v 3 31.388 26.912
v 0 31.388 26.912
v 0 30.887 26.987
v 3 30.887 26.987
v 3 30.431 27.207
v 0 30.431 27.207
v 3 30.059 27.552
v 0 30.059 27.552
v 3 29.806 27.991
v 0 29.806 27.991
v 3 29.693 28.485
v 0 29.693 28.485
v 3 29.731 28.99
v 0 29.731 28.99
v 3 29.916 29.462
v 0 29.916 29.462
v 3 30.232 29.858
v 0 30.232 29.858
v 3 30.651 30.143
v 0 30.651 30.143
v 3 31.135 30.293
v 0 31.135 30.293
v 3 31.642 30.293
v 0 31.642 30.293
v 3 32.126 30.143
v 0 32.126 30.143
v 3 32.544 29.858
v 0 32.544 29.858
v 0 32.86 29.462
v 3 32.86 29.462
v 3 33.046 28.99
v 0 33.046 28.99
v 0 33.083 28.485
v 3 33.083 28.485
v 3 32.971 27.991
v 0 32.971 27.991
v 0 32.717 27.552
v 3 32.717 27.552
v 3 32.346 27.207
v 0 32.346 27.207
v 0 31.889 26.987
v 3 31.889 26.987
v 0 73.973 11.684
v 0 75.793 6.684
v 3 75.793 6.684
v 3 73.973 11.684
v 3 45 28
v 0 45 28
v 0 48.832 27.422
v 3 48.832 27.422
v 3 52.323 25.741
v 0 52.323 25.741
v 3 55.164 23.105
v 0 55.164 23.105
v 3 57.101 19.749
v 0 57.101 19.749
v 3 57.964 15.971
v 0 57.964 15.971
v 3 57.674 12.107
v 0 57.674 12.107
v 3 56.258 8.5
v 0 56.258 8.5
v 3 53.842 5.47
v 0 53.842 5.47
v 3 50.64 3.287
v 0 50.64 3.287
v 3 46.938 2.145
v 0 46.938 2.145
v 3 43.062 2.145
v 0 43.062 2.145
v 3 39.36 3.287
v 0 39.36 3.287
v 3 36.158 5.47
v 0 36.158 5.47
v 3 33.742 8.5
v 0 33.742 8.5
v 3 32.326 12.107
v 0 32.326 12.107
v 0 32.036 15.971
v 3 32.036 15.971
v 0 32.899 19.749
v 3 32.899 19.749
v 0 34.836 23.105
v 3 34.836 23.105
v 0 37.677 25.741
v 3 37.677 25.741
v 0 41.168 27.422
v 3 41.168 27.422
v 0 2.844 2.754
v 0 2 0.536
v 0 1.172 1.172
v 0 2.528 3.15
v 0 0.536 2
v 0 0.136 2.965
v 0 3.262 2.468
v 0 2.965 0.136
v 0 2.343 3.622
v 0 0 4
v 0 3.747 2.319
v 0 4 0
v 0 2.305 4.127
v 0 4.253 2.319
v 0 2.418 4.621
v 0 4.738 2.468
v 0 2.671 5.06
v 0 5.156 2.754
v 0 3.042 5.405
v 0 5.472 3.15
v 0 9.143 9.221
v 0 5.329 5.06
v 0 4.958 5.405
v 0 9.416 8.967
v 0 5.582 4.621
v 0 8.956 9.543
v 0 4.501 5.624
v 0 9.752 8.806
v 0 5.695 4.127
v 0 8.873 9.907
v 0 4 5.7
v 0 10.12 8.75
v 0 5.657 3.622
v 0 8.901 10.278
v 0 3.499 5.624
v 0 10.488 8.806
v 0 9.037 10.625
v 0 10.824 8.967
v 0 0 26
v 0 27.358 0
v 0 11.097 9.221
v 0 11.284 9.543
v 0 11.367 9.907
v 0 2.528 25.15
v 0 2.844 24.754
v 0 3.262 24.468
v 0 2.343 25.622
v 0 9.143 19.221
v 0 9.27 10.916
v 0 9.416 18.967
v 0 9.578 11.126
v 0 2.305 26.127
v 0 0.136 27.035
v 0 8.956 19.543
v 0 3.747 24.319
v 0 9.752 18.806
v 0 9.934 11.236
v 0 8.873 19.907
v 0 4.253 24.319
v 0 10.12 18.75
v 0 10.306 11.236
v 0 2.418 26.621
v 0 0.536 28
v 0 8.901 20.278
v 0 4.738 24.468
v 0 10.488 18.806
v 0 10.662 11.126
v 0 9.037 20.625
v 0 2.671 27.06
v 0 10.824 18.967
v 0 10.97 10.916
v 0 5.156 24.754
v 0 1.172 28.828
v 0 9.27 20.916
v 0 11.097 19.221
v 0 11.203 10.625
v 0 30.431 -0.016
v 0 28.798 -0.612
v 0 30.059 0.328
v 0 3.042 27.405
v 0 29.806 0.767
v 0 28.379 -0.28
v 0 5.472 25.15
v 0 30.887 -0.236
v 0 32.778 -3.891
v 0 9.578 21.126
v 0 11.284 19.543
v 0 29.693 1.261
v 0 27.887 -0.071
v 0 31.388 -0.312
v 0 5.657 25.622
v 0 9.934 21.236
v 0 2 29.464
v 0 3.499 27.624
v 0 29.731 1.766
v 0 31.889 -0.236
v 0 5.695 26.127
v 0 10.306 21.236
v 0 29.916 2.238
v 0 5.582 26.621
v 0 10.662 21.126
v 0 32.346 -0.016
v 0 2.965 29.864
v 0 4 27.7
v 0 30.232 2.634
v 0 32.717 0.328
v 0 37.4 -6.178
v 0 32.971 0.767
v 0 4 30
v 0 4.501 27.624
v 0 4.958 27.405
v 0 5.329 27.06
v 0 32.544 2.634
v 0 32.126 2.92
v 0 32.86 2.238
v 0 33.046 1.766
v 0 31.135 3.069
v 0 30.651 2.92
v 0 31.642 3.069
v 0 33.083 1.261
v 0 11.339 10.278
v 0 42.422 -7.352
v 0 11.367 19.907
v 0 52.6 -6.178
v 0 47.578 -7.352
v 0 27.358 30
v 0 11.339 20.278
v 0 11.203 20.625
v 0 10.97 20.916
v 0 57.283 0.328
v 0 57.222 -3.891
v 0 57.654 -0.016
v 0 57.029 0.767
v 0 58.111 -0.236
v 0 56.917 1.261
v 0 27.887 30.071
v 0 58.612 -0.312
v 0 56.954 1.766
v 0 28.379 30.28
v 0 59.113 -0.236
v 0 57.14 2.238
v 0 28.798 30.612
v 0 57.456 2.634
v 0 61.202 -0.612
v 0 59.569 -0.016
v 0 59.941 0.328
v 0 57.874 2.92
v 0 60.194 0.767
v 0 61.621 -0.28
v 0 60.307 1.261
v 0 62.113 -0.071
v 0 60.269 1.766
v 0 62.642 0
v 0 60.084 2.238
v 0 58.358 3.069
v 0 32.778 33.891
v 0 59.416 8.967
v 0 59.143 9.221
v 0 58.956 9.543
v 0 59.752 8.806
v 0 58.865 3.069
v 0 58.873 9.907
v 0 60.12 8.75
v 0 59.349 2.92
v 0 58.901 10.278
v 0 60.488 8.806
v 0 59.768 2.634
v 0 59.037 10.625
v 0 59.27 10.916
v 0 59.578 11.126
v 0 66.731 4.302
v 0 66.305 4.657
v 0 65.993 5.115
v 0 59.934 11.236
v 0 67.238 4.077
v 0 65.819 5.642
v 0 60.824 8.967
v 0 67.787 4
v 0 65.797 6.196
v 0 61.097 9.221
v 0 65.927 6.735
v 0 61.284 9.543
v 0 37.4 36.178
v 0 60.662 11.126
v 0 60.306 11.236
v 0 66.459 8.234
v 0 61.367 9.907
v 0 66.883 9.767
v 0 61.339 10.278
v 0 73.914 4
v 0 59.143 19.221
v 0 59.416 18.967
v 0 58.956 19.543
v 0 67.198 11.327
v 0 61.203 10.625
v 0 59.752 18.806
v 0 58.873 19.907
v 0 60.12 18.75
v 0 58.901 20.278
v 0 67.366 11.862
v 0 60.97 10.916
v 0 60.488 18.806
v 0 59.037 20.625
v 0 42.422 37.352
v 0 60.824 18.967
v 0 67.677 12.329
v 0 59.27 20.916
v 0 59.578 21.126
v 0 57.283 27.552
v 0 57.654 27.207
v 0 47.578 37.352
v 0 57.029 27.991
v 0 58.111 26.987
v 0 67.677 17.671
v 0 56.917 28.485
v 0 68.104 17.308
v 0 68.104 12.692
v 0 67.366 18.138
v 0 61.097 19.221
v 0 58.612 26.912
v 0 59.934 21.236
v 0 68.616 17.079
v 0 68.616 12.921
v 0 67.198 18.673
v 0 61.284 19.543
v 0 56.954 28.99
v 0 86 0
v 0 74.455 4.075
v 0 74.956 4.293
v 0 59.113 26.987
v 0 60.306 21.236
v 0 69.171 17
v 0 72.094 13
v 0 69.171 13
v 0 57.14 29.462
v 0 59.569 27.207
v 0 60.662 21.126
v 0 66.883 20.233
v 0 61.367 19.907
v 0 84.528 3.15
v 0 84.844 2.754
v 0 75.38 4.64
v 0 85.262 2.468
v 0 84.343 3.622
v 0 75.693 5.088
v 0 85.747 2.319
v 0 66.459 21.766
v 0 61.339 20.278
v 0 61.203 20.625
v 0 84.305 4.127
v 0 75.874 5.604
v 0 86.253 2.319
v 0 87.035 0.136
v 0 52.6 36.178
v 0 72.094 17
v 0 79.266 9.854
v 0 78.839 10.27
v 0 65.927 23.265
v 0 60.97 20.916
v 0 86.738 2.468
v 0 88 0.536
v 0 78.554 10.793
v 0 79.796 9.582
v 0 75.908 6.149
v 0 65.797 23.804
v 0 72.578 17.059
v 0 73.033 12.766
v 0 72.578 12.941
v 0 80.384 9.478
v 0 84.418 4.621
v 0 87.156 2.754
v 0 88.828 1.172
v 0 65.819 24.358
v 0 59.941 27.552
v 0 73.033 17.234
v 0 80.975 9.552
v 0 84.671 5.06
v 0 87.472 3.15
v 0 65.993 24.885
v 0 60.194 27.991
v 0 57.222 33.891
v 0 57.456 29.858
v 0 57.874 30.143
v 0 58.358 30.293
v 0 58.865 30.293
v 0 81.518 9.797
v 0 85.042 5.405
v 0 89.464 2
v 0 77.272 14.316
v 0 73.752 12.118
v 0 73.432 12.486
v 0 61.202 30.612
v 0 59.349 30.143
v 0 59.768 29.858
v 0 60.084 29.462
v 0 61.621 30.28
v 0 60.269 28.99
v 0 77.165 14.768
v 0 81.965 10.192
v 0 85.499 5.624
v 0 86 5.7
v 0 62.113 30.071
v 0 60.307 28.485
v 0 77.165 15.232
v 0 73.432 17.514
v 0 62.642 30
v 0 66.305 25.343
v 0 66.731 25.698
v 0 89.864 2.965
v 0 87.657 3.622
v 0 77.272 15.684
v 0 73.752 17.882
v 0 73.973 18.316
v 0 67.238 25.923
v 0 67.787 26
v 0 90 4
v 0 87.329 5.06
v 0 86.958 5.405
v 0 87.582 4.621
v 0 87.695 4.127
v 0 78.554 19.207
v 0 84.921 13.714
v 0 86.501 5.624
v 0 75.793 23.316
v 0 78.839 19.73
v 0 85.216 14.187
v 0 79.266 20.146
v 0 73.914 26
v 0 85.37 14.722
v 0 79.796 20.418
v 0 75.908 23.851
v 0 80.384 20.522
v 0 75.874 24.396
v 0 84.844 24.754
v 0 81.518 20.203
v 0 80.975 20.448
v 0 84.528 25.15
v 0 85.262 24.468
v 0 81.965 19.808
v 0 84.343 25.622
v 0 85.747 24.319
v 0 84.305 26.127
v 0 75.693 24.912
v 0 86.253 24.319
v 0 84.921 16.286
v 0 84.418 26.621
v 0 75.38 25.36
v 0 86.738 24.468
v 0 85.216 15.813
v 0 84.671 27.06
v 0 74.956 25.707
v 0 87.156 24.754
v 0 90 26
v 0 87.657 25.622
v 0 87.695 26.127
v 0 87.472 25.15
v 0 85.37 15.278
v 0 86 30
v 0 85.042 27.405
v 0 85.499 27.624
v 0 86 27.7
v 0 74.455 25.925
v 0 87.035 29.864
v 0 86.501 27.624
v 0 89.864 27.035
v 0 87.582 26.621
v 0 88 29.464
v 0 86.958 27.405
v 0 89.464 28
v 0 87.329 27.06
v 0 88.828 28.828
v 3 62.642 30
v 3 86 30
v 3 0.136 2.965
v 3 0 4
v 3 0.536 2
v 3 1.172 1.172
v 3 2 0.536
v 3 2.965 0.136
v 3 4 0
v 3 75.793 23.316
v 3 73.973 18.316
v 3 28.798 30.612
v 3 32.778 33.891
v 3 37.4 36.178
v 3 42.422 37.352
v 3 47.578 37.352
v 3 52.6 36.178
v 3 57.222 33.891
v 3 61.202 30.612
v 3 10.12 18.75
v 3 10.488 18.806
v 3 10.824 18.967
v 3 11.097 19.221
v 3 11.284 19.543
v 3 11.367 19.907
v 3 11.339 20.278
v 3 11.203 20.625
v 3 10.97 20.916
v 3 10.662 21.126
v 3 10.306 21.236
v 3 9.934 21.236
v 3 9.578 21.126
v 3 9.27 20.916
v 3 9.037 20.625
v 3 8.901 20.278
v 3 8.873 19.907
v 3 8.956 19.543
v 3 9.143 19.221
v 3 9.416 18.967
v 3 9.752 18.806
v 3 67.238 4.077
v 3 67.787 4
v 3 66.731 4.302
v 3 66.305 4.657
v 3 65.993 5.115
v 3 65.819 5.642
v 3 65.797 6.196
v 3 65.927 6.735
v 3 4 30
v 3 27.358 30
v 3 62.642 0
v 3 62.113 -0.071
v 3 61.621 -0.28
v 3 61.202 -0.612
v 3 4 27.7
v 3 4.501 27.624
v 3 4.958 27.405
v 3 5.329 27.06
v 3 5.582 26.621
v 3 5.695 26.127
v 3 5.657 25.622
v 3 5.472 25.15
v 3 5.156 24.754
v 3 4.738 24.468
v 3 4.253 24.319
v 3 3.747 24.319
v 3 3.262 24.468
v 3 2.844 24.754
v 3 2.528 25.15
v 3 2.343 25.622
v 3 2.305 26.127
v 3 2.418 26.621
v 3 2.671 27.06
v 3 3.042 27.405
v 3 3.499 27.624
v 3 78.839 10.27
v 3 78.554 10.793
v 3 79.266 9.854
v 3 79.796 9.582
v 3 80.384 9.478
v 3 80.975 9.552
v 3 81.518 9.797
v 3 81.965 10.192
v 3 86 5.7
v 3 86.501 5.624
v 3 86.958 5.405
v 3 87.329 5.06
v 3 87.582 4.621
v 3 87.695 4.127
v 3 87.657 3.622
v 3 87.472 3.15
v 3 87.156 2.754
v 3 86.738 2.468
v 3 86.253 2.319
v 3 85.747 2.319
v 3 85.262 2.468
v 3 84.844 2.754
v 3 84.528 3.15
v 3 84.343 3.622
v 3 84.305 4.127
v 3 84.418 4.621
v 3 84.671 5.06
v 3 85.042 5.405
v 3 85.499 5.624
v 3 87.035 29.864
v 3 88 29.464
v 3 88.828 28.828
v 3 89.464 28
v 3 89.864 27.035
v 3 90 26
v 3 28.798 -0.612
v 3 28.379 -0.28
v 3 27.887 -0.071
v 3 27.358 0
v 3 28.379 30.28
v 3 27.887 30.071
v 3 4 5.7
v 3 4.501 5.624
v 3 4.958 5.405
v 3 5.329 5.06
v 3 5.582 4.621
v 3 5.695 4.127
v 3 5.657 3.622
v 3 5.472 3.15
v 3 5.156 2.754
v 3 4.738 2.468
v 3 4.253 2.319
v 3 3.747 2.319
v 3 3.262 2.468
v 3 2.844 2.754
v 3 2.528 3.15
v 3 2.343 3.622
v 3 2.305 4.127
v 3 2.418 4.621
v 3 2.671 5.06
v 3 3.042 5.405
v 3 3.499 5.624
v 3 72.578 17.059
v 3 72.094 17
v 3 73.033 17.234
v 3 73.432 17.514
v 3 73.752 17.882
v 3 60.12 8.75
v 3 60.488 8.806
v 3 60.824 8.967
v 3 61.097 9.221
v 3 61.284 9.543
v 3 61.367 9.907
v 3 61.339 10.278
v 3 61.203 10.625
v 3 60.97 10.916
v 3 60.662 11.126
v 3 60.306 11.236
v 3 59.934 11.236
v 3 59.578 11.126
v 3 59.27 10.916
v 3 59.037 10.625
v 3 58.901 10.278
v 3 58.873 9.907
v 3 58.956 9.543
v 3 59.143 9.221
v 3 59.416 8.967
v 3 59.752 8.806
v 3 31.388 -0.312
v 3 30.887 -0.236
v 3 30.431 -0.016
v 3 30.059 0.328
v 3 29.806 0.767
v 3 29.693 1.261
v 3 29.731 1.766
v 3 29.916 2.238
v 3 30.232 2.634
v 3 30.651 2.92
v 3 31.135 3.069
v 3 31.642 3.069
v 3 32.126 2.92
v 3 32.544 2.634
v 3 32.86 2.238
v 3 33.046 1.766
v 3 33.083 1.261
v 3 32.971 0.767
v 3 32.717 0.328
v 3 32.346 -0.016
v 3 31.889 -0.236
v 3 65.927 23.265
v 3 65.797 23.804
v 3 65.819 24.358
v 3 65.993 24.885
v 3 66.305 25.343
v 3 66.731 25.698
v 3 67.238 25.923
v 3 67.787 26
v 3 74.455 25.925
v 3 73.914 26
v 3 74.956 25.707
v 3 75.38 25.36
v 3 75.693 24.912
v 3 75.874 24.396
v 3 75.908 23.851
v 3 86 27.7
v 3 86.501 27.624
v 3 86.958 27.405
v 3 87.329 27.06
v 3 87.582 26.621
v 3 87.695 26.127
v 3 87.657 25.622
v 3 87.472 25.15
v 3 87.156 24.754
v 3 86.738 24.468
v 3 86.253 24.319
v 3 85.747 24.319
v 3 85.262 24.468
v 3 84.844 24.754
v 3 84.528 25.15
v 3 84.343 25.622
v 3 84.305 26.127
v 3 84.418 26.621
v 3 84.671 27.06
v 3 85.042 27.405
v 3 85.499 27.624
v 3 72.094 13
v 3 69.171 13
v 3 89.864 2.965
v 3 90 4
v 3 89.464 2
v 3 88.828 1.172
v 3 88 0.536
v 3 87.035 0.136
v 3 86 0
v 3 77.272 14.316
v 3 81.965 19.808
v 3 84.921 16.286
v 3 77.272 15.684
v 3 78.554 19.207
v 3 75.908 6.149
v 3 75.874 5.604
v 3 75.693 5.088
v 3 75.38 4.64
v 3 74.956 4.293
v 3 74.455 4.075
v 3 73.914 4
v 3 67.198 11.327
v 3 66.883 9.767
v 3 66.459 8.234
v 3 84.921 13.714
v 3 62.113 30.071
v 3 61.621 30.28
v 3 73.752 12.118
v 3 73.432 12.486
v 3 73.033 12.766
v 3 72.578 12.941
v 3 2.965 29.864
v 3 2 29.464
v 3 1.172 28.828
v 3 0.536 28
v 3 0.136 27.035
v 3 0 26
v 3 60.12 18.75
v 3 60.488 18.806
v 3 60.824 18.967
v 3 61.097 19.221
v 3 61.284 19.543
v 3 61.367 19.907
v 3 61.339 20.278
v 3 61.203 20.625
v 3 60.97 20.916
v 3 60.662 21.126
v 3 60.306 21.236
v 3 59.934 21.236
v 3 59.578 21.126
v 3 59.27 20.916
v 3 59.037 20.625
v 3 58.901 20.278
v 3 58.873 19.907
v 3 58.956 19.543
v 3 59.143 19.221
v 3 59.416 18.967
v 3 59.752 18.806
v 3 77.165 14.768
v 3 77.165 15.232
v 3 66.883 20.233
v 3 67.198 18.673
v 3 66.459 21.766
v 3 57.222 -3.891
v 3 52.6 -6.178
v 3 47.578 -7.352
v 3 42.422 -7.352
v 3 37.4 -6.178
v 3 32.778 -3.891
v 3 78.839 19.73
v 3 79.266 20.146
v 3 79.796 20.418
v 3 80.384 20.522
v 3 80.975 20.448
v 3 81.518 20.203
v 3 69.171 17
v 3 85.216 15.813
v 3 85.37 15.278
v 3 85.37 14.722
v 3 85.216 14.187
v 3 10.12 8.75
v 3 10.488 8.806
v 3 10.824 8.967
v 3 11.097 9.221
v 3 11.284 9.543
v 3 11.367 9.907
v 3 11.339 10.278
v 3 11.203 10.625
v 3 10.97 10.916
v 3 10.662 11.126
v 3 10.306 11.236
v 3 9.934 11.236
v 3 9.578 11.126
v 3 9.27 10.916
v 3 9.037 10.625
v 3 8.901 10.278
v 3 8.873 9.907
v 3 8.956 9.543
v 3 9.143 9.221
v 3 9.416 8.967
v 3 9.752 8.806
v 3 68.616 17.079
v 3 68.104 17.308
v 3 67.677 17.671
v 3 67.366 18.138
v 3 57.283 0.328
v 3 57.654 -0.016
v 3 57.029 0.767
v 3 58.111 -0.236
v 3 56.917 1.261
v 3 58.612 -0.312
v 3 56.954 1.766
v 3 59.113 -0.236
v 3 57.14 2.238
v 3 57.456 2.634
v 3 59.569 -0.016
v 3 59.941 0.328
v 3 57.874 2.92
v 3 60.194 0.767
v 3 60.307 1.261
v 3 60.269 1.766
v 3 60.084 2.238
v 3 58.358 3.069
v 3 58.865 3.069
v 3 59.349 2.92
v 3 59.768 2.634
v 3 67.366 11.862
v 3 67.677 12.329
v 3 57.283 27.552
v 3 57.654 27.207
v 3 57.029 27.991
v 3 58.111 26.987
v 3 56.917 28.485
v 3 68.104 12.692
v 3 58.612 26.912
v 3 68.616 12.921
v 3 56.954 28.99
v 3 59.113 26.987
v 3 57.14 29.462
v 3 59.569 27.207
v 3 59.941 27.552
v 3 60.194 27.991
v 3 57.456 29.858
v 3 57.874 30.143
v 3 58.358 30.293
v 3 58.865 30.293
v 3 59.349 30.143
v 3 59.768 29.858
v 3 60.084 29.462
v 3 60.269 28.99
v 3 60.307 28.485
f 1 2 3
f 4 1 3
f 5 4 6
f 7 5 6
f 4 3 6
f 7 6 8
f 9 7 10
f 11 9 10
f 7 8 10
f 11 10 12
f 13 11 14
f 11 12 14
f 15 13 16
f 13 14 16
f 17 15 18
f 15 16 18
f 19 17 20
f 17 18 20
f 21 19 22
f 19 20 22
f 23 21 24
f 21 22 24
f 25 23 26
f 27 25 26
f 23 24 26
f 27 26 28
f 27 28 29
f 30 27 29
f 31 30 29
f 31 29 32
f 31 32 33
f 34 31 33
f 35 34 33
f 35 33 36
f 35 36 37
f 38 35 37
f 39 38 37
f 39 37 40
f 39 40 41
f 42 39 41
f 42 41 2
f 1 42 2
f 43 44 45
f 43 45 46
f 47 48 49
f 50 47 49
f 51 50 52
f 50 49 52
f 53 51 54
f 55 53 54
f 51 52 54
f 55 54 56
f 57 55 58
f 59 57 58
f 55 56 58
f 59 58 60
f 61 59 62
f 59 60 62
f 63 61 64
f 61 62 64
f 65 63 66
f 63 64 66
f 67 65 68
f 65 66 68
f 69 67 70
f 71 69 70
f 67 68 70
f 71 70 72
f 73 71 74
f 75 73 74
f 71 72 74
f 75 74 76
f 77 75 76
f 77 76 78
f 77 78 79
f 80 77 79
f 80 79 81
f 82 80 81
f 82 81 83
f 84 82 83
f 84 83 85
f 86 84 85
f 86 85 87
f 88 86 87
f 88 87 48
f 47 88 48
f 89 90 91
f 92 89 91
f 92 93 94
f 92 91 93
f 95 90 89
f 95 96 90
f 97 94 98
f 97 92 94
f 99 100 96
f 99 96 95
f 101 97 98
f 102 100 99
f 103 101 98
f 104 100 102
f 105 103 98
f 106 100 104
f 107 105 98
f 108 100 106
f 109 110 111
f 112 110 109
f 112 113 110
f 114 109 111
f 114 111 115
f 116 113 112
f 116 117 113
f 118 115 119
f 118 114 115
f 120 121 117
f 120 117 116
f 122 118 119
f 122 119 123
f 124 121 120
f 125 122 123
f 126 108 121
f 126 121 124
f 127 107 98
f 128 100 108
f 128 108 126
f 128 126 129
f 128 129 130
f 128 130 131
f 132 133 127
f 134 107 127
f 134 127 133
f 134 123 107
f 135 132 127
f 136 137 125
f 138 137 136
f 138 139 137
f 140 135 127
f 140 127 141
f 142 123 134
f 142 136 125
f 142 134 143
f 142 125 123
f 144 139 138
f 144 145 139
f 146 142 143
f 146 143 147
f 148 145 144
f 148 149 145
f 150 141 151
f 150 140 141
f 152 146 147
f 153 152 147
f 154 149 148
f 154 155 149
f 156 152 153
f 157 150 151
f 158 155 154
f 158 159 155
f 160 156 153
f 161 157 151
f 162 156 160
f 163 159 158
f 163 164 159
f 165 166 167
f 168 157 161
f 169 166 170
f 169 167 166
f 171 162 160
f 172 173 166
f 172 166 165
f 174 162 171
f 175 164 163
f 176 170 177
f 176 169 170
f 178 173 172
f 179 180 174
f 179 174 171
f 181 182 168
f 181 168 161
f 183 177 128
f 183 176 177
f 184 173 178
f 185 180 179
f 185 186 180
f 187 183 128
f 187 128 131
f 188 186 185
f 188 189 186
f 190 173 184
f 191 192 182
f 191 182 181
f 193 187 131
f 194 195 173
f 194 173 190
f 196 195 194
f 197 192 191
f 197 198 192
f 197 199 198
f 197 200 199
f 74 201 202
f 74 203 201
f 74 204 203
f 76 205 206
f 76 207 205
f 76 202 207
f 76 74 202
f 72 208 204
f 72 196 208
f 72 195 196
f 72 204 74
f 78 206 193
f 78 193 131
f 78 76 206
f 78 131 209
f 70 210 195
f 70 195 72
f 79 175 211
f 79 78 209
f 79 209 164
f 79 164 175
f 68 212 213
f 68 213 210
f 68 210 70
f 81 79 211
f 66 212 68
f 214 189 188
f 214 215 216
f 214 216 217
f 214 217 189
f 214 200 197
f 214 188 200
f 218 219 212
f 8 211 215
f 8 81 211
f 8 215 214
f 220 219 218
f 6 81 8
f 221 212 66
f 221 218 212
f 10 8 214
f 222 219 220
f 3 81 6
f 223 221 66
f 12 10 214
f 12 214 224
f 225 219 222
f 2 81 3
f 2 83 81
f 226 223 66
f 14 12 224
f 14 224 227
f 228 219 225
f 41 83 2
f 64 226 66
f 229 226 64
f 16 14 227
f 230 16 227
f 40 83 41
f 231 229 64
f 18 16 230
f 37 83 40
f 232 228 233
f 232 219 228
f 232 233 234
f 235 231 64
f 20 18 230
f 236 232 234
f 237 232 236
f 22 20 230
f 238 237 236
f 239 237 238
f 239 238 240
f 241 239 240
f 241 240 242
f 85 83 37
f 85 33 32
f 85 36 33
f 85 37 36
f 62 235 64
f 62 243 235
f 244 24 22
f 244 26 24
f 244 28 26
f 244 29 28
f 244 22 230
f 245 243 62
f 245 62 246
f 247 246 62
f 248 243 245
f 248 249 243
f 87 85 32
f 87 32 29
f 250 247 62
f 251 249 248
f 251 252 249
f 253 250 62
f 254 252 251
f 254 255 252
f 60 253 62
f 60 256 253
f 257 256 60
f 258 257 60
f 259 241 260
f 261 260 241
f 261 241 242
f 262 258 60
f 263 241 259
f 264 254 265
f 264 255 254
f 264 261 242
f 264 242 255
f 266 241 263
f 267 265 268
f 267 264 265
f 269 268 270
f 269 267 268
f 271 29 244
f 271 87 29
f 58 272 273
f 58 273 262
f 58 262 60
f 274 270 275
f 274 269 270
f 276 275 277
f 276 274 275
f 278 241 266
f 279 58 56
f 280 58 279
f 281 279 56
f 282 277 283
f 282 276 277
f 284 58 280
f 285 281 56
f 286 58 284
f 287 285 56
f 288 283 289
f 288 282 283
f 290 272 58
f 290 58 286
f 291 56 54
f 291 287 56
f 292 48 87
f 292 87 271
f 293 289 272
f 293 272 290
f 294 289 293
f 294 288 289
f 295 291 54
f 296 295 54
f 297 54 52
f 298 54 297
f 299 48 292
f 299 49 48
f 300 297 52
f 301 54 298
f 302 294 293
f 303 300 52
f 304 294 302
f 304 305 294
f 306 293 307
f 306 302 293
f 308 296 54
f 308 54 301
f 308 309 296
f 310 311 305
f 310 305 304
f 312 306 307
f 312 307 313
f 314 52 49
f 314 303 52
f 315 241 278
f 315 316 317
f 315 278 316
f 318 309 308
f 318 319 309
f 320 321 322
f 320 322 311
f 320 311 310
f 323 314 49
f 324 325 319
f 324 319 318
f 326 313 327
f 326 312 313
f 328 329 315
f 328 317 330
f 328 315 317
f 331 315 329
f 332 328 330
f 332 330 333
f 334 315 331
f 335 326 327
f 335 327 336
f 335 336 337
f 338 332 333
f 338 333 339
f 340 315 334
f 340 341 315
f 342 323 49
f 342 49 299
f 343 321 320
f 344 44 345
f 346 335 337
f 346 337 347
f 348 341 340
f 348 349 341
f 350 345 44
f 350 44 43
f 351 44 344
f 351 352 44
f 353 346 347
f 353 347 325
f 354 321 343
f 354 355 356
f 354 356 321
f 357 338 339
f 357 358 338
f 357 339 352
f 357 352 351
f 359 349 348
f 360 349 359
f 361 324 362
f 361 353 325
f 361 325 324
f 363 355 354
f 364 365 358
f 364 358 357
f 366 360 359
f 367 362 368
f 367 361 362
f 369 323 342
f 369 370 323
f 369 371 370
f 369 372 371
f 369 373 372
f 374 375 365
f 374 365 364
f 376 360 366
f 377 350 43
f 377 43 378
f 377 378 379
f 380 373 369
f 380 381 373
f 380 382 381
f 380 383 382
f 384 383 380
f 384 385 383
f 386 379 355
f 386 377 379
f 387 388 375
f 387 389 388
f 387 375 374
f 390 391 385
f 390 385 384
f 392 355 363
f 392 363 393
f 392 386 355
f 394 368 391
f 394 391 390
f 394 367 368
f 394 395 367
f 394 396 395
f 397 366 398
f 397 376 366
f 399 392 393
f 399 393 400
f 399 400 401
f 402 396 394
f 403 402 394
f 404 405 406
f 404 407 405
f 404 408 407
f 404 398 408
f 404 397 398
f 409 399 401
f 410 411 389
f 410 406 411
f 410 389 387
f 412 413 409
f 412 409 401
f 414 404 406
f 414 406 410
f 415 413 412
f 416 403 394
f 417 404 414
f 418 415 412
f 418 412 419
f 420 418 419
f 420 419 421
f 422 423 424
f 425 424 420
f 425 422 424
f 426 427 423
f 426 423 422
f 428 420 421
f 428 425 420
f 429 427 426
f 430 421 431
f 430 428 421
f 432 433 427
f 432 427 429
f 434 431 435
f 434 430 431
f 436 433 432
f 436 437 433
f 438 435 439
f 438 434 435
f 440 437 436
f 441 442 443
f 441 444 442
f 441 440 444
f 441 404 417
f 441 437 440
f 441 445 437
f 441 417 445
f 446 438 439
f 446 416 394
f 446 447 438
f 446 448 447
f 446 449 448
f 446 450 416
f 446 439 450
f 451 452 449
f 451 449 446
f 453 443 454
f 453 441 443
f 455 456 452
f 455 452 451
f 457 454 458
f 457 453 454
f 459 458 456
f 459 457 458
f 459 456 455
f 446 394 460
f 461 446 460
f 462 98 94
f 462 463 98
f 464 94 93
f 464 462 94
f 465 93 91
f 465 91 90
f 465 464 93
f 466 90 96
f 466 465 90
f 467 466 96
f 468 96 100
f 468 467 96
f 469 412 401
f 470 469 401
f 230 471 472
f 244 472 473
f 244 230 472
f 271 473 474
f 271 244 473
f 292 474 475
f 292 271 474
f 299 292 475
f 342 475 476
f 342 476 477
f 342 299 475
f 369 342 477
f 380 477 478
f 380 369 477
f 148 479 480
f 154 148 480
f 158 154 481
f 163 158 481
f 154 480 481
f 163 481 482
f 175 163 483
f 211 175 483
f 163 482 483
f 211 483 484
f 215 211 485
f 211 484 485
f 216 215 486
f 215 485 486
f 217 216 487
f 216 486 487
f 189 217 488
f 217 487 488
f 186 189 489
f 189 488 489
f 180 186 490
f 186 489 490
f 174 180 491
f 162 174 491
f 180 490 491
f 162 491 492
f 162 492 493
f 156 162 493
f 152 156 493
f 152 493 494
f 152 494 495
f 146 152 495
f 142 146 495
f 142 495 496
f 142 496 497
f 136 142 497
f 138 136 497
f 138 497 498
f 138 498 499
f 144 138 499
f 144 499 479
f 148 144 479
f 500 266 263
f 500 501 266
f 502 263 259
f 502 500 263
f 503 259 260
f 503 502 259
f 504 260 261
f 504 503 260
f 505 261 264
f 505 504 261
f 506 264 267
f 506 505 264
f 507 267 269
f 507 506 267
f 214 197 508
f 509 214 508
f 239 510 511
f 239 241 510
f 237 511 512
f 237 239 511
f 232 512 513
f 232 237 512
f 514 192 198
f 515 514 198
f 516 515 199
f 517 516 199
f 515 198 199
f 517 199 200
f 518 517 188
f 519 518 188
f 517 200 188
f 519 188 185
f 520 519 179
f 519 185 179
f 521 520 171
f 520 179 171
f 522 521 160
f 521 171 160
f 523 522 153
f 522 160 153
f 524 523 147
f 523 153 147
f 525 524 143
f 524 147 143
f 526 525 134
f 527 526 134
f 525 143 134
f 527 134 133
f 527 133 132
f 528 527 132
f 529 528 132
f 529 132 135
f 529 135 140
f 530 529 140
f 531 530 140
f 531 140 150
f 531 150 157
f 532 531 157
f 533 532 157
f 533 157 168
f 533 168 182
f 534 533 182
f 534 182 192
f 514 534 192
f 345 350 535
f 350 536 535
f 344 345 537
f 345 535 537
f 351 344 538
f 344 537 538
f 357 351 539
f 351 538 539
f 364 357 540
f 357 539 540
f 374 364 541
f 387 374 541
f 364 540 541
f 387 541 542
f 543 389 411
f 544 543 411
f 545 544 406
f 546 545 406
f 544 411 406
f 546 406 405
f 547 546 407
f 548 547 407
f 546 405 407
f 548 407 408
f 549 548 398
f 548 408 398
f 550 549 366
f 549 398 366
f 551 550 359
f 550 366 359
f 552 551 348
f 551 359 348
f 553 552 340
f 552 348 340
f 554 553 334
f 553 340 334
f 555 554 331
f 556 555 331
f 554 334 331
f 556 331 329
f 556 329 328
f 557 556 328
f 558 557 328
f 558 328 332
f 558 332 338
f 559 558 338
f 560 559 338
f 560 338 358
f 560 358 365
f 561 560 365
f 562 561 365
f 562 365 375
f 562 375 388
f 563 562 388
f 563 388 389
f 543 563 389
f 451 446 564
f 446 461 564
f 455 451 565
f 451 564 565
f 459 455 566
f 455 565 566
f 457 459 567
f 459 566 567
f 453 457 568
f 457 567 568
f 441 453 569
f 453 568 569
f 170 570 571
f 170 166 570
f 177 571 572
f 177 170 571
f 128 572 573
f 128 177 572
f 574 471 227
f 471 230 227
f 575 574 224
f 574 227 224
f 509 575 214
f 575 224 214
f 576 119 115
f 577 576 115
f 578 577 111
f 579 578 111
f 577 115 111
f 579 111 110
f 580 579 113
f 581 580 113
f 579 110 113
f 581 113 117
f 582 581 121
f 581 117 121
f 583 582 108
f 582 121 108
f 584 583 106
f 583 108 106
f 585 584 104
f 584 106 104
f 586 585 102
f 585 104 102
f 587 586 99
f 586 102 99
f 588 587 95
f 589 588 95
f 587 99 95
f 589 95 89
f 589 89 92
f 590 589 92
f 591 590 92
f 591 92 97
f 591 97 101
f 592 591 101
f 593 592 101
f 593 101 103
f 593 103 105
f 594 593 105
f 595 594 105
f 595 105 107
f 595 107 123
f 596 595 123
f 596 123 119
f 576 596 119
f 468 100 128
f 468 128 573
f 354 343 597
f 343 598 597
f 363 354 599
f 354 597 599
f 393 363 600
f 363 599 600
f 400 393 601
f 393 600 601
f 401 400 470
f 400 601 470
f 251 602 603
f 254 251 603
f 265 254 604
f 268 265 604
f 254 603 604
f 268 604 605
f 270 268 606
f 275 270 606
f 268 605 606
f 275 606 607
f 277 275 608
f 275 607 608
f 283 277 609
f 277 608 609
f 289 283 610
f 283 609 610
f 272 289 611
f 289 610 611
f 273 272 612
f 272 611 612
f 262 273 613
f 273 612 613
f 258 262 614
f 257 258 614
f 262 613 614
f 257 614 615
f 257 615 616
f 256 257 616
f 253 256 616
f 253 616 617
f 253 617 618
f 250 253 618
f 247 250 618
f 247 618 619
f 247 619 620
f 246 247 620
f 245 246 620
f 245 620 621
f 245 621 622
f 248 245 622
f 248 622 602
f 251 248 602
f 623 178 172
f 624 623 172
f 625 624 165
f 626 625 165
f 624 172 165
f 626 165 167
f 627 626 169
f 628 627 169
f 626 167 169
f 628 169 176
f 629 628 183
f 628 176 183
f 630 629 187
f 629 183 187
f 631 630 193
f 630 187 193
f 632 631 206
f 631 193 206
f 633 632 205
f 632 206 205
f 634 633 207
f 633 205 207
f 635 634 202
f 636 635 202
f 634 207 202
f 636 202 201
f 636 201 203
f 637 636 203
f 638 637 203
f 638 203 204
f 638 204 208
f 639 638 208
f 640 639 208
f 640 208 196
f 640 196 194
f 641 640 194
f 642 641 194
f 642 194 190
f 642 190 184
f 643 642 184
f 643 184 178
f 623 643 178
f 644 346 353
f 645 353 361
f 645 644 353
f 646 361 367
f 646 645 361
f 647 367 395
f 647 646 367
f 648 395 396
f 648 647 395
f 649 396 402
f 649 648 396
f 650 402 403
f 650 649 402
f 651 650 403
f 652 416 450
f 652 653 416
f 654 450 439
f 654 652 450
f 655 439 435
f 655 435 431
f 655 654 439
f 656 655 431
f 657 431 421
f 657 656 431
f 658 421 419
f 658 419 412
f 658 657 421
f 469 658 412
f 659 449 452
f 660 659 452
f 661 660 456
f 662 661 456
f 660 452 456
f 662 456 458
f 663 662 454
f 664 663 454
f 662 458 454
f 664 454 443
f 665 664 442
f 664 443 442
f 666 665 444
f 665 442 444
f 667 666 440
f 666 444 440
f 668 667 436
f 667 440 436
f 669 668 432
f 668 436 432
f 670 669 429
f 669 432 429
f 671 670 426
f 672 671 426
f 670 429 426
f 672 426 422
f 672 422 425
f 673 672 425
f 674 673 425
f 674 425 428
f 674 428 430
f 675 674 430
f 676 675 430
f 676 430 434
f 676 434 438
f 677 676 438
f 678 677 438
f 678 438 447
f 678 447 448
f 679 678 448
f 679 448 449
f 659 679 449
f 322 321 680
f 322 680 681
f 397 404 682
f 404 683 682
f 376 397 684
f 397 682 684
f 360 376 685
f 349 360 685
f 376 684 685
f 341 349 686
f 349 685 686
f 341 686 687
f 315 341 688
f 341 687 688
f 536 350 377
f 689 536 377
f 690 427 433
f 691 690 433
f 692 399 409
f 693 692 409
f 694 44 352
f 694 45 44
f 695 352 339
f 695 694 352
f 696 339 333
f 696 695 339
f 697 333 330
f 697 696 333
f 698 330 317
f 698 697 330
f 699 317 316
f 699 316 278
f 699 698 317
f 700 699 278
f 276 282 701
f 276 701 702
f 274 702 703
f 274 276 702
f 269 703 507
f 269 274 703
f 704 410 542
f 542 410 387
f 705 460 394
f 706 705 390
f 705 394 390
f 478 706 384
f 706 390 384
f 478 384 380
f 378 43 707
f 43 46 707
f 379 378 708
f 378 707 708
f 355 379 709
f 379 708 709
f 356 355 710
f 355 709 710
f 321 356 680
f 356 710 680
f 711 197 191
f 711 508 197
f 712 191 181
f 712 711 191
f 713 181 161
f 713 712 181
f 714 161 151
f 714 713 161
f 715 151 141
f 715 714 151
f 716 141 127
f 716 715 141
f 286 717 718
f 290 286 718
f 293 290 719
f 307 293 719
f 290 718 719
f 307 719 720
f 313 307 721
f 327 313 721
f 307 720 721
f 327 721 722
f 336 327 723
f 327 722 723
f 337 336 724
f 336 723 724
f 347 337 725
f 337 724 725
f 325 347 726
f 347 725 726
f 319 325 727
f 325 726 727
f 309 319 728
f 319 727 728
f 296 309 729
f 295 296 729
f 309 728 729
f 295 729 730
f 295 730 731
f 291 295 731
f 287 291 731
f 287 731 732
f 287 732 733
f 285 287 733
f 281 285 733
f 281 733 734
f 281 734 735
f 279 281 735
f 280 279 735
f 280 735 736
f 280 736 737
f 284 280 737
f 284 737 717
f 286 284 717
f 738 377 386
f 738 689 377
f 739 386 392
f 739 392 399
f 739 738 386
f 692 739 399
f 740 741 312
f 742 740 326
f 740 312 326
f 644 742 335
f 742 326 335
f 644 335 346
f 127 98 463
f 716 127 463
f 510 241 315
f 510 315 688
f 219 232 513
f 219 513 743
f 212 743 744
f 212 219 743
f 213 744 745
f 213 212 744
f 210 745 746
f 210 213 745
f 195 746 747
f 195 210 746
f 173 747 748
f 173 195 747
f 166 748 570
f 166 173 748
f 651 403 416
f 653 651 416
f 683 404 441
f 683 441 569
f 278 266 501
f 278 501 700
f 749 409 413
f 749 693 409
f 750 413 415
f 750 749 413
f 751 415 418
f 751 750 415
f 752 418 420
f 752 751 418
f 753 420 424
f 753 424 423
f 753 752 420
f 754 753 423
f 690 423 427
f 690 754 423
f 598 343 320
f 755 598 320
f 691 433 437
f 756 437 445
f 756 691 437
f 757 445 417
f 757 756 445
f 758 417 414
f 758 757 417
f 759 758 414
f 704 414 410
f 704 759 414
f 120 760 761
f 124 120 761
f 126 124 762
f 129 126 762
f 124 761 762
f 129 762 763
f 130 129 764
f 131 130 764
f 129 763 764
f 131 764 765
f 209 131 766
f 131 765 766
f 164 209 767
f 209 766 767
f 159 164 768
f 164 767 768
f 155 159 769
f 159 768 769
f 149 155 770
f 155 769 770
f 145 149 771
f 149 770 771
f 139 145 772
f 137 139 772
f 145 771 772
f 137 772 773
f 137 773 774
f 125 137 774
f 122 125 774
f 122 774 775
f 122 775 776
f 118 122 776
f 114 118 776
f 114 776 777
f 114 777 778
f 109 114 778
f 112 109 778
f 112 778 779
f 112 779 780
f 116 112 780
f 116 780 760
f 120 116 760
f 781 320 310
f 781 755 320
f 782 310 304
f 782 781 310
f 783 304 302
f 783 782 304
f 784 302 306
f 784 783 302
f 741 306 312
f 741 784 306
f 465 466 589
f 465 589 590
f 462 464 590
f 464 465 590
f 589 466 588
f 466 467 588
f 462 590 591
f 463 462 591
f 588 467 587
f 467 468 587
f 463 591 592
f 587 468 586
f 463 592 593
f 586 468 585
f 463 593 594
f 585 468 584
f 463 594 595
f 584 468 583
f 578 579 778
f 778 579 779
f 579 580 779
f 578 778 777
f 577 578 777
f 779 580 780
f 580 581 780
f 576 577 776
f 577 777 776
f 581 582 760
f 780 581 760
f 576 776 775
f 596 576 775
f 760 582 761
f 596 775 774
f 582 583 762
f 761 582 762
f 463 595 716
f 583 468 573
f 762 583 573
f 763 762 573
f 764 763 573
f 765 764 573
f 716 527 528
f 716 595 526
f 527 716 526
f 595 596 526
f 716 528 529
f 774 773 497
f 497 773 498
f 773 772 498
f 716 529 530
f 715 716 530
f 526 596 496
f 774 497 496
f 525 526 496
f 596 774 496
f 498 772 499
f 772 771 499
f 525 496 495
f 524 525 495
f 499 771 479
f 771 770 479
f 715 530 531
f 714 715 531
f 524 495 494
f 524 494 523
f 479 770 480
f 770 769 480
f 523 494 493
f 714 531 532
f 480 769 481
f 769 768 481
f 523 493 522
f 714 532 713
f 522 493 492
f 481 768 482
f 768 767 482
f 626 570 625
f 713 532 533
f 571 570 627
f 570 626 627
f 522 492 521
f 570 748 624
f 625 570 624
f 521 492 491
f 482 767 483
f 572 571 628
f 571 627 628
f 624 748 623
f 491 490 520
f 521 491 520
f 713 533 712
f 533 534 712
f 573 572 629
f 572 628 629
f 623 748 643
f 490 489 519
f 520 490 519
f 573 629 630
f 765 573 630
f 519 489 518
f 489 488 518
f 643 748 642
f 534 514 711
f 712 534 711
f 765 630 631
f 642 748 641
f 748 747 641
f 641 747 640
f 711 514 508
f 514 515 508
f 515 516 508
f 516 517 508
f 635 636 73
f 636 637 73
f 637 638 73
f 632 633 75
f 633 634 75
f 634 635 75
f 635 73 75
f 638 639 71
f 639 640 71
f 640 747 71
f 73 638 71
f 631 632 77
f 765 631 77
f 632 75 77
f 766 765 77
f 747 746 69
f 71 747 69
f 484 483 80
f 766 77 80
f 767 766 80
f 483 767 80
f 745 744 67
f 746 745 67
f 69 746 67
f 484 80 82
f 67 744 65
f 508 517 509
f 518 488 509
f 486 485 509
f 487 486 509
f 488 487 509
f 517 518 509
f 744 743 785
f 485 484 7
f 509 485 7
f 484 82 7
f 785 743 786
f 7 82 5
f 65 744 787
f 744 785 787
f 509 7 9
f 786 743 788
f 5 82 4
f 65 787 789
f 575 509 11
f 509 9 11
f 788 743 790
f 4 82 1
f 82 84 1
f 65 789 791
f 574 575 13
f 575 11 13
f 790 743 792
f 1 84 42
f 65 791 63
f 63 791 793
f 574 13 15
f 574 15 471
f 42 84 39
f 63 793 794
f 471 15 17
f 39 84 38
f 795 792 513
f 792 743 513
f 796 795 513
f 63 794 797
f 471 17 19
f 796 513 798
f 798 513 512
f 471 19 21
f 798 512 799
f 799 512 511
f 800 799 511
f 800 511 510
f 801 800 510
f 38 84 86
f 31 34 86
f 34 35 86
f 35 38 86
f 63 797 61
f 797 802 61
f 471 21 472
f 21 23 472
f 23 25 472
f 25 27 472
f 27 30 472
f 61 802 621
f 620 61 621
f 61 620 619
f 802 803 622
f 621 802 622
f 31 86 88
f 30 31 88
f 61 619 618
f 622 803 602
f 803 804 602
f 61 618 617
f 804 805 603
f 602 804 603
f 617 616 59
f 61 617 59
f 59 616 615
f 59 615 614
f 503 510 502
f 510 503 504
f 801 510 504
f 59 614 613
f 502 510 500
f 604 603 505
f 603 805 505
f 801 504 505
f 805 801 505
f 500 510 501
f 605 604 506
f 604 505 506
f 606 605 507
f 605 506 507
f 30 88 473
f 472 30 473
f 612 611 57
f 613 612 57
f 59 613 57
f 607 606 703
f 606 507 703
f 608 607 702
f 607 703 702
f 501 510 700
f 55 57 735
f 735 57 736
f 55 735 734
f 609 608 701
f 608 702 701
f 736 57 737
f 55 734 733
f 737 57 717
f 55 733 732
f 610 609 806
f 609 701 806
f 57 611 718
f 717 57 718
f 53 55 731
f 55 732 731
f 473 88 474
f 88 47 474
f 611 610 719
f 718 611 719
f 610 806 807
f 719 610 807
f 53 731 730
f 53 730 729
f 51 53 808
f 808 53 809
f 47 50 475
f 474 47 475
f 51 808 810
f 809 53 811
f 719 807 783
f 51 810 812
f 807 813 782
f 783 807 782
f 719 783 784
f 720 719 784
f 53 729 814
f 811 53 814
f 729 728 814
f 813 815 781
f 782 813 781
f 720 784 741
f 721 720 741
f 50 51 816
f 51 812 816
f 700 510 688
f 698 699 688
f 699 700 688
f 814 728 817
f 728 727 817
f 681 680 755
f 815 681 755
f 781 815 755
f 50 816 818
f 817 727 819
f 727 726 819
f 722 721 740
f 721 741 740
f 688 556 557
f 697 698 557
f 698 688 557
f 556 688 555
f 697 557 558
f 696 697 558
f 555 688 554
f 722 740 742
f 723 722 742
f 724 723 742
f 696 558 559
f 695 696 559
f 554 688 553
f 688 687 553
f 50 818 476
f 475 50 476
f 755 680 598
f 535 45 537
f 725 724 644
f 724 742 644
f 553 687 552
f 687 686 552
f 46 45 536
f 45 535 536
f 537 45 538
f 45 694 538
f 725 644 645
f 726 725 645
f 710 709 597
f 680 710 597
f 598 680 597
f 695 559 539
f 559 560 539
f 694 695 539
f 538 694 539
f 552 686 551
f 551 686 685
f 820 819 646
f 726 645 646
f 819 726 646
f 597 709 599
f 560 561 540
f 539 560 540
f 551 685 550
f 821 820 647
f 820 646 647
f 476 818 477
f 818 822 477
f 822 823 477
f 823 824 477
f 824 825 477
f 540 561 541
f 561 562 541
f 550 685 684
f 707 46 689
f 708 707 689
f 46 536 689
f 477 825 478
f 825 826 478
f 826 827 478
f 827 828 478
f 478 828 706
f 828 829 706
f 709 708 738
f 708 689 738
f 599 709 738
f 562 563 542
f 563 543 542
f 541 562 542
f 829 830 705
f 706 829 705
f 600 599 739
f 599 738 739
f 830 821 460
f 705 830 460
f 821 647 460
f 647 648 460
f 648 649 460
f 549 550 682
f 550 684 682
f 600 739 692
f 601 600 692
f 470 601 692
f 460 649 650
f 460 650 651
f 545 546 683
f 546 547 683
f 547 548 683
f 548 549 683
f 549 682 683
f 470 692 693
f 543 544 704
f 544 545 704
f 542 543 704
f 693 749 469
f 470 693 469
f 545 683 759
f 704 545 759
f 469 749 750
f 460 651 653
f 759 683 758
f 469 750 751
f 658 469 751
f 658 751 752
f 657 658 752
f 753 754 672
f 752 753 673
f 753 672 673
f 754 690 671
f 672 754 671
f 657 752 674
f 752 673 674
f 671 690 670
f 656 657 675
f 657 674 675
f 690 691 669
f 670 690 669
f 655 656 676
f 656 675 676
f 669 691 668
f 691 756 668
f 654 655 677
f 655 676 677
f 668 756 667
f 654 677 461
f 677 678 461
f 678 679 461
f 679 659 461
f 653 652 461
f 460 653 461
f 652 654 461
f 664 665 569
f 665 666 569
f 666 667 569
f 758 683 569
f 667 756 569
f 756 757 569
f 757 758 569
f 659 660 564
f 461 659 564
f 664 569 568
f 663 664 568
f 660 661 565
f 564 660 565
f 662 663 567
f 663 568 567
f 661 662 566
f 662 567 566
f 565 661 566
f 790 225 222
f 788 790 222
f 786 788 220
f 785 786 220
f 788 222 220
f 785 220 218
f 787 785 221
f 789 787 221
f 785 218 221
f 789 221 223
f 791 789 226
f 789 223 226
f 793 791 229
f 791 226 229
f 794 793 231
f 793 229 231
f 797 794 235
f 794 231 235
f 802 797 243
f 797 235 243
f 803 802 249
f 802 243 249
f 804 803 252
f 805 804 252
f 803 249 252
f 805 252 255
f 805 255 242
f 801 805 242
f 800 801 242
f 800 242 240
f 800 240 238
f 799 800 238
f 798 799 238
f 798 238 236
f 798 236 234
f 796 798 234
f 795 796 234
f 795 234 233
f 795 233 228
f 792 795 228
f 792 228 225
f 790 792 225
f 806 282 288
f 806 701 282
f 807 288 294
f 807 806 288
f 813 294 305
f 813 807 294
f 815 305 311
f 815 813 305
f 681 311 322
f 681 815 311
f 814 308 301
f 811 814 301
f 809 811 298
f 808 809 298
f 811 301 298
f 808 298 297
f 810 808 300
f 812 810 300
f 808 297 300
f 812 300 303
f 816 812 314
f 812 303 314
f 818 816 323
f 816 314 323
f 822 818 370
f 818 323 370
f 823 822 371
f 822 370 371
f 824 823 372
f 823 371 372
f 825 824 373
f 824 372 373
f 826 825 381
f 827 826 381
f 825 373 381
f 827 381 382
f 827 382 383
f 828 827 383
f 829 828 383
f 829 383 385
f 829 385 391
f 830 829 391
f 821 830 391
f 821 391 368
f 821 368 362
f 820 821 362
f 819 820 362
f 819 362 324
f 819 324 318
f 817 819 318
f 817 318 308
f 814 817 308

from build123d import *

# Parameters (mm, degrees)
SKETCH_1_W          = 3
SKETCH_1_H          = 30
EXTRUDE_1_DEPTH     = 90
SKETCH_2_R          = 22.5
EXTRUDE_2_DEPTH     = 3
SKETCH_3_R          = 13
CUT_EXTRUDE_1_DEPTH = 98.546142927
HOLE_WIZARD_M31_D   = 3.4
HOLE_WIZARD_M32_D   = 3.4
FILLET_1_R          = 4
M3X0_51_D           = 2.5
CUT_EXTRUDE_2_DEPTH = 98.546142927
FILLET_2_R          = 2


with BuildPart() as part:
    # Эскиз1 → Бобышка-Вытянуть1 (new body)
    with BuildSketch(Plane(origin=(0, 0, 0), x_dir=(1, 0, 0), z_dir=(0, 1, 0))):
        with Locations((1.5, -15)):
            Rectangle(SKETCH_1_W, SKETCH_1_H)
    extrude(amount=EXTRUDE_1_DEPTH)

    # Эскиз2 → Бобышка-Вытянуть2 (add)
    with BuildSketch(Plane.ZY):
        with Locations((15, 45)):
            Circle(SKETCH_2_R)
    extrude(amount=-EXTRUDE_2_DEPTH)

    # Эскиз3 → Вырез-Вытянуть1 (cut, through all)
    with BuildSketch(Plane.ZY):
        with Locations((15, 45)):
            Circle(SKETCH_3_R)
    extrude(amount=-CUT_EXTRUDE_1_DEPTH, mode=Mode.SUBTRACT)

    # Отверстие с зазором M31 (through all)
    with Locations(Plane(origin=(3, -25.024735225, 7.262908886), x_dir=(0, 0, 1), z_dir=(1, 0, 0))):
        with Locations((21.348896652, -83.636540763), (-5.874714424, -83.636540763), (-5.874714424, -56.412929688), (21.348896652, -56.412929688)):
            Hole(HOLE_WIZARD_M31_D / 2)

    # Отверстие с зазором M32 (through all)
    with Locations(Plane(origin=(3, 0, 0), x_dir=(0, 0, -1), z_dir=(1, 0, 0))):
        with Locations((-26, 86), (-4, 86), (-4, 4), (-26, 4)):
            Hole(HOLE_WIZARD_M32_D / 2)

    # Скругление1
    fillet_1_edges = [part.edges().sort_by_distance(p)[0] for p in [
        (1.5, 90, 0),
        (1.5, 0, 0),
        (1.5, 0, 30),
        (1.5, 90, 30),
    ]]
    fillet(fillet_1_edges, radius=FILLET_1_R)

    # Отверстие обработанное метчиком M3x0.51 (through all)
    with Locations(Plane.ZY):
        with Locations((10, 60.12), (20, 60.12), (10, 10.12), (20, 10.12)):
            Hole(M3X0_51_D / 2)

    # Эскиз14 → Вырез-Вытянуть2 (cut, through all)
    with BuildSketch(Plane.ZY):
        with BuildLine():
            Line((13, 73.494171949), (13, 67.410934831))
            ThreePointArc((13, 67.410934831), (8.352708916, 66.495662847), (4, 64.627786426))
            Line((4, 64.627786426), (4, 76.769904057))
            Line((4, 76.769904057), (13, 73.494171949))
        make_face()
        with BuildLine():
            Line((17, 73.494171949), (17, 67.410934831))
            ThreePointArc((17, 67.410934831), (21.647291084, 66.495662847), (26, 64.627786426))
            Line((26, 64.627786426), (26, 76.769904057))
            Line((26, 76.769904057), (17, 73.494171949))
        make_face()
        Polygon((7.538207724, 79.738812853), (15, 77.02294257), (22.461792276, 79.738812853), (15, 86), align=None)
    extrude(amount=-CUT_EXTRUDE_2_DEPTH, mode=Mode.SUBTRACT)

    # Скругление2
    fillet_2_edges = [part.edges().sort_by_distance(p)[0] for p in [
        (1.5, 67.410934831, 13),
        (1.5, 64.627786426, 4),
        (1.5, 76.769904057, 4),
        (1.5, 73.494171949, 13),
        (1.5, 28.229490169, 0),
        (1.5, 61.770509831, 0),
        (1.5, 64.627786426, 26),
        (1.5, 67.410934831, 17),
        (1.5, 73.494171949, 17),
        (1.5, 76.769904057, 26),
        (1.5, 79.738812853, 7.538207724),
        (1.5, 86, 15),
        (1.5, 79.738812853, 22.461792276),
        (1.5, 77.02294257, 15),
        (1.5, 28.229490169, 30),
        (1.5, 61.770509831, 30),
    ]]
    fillet(fillet_2_edges, radius=FILLET_2_R)


solid = part.part
